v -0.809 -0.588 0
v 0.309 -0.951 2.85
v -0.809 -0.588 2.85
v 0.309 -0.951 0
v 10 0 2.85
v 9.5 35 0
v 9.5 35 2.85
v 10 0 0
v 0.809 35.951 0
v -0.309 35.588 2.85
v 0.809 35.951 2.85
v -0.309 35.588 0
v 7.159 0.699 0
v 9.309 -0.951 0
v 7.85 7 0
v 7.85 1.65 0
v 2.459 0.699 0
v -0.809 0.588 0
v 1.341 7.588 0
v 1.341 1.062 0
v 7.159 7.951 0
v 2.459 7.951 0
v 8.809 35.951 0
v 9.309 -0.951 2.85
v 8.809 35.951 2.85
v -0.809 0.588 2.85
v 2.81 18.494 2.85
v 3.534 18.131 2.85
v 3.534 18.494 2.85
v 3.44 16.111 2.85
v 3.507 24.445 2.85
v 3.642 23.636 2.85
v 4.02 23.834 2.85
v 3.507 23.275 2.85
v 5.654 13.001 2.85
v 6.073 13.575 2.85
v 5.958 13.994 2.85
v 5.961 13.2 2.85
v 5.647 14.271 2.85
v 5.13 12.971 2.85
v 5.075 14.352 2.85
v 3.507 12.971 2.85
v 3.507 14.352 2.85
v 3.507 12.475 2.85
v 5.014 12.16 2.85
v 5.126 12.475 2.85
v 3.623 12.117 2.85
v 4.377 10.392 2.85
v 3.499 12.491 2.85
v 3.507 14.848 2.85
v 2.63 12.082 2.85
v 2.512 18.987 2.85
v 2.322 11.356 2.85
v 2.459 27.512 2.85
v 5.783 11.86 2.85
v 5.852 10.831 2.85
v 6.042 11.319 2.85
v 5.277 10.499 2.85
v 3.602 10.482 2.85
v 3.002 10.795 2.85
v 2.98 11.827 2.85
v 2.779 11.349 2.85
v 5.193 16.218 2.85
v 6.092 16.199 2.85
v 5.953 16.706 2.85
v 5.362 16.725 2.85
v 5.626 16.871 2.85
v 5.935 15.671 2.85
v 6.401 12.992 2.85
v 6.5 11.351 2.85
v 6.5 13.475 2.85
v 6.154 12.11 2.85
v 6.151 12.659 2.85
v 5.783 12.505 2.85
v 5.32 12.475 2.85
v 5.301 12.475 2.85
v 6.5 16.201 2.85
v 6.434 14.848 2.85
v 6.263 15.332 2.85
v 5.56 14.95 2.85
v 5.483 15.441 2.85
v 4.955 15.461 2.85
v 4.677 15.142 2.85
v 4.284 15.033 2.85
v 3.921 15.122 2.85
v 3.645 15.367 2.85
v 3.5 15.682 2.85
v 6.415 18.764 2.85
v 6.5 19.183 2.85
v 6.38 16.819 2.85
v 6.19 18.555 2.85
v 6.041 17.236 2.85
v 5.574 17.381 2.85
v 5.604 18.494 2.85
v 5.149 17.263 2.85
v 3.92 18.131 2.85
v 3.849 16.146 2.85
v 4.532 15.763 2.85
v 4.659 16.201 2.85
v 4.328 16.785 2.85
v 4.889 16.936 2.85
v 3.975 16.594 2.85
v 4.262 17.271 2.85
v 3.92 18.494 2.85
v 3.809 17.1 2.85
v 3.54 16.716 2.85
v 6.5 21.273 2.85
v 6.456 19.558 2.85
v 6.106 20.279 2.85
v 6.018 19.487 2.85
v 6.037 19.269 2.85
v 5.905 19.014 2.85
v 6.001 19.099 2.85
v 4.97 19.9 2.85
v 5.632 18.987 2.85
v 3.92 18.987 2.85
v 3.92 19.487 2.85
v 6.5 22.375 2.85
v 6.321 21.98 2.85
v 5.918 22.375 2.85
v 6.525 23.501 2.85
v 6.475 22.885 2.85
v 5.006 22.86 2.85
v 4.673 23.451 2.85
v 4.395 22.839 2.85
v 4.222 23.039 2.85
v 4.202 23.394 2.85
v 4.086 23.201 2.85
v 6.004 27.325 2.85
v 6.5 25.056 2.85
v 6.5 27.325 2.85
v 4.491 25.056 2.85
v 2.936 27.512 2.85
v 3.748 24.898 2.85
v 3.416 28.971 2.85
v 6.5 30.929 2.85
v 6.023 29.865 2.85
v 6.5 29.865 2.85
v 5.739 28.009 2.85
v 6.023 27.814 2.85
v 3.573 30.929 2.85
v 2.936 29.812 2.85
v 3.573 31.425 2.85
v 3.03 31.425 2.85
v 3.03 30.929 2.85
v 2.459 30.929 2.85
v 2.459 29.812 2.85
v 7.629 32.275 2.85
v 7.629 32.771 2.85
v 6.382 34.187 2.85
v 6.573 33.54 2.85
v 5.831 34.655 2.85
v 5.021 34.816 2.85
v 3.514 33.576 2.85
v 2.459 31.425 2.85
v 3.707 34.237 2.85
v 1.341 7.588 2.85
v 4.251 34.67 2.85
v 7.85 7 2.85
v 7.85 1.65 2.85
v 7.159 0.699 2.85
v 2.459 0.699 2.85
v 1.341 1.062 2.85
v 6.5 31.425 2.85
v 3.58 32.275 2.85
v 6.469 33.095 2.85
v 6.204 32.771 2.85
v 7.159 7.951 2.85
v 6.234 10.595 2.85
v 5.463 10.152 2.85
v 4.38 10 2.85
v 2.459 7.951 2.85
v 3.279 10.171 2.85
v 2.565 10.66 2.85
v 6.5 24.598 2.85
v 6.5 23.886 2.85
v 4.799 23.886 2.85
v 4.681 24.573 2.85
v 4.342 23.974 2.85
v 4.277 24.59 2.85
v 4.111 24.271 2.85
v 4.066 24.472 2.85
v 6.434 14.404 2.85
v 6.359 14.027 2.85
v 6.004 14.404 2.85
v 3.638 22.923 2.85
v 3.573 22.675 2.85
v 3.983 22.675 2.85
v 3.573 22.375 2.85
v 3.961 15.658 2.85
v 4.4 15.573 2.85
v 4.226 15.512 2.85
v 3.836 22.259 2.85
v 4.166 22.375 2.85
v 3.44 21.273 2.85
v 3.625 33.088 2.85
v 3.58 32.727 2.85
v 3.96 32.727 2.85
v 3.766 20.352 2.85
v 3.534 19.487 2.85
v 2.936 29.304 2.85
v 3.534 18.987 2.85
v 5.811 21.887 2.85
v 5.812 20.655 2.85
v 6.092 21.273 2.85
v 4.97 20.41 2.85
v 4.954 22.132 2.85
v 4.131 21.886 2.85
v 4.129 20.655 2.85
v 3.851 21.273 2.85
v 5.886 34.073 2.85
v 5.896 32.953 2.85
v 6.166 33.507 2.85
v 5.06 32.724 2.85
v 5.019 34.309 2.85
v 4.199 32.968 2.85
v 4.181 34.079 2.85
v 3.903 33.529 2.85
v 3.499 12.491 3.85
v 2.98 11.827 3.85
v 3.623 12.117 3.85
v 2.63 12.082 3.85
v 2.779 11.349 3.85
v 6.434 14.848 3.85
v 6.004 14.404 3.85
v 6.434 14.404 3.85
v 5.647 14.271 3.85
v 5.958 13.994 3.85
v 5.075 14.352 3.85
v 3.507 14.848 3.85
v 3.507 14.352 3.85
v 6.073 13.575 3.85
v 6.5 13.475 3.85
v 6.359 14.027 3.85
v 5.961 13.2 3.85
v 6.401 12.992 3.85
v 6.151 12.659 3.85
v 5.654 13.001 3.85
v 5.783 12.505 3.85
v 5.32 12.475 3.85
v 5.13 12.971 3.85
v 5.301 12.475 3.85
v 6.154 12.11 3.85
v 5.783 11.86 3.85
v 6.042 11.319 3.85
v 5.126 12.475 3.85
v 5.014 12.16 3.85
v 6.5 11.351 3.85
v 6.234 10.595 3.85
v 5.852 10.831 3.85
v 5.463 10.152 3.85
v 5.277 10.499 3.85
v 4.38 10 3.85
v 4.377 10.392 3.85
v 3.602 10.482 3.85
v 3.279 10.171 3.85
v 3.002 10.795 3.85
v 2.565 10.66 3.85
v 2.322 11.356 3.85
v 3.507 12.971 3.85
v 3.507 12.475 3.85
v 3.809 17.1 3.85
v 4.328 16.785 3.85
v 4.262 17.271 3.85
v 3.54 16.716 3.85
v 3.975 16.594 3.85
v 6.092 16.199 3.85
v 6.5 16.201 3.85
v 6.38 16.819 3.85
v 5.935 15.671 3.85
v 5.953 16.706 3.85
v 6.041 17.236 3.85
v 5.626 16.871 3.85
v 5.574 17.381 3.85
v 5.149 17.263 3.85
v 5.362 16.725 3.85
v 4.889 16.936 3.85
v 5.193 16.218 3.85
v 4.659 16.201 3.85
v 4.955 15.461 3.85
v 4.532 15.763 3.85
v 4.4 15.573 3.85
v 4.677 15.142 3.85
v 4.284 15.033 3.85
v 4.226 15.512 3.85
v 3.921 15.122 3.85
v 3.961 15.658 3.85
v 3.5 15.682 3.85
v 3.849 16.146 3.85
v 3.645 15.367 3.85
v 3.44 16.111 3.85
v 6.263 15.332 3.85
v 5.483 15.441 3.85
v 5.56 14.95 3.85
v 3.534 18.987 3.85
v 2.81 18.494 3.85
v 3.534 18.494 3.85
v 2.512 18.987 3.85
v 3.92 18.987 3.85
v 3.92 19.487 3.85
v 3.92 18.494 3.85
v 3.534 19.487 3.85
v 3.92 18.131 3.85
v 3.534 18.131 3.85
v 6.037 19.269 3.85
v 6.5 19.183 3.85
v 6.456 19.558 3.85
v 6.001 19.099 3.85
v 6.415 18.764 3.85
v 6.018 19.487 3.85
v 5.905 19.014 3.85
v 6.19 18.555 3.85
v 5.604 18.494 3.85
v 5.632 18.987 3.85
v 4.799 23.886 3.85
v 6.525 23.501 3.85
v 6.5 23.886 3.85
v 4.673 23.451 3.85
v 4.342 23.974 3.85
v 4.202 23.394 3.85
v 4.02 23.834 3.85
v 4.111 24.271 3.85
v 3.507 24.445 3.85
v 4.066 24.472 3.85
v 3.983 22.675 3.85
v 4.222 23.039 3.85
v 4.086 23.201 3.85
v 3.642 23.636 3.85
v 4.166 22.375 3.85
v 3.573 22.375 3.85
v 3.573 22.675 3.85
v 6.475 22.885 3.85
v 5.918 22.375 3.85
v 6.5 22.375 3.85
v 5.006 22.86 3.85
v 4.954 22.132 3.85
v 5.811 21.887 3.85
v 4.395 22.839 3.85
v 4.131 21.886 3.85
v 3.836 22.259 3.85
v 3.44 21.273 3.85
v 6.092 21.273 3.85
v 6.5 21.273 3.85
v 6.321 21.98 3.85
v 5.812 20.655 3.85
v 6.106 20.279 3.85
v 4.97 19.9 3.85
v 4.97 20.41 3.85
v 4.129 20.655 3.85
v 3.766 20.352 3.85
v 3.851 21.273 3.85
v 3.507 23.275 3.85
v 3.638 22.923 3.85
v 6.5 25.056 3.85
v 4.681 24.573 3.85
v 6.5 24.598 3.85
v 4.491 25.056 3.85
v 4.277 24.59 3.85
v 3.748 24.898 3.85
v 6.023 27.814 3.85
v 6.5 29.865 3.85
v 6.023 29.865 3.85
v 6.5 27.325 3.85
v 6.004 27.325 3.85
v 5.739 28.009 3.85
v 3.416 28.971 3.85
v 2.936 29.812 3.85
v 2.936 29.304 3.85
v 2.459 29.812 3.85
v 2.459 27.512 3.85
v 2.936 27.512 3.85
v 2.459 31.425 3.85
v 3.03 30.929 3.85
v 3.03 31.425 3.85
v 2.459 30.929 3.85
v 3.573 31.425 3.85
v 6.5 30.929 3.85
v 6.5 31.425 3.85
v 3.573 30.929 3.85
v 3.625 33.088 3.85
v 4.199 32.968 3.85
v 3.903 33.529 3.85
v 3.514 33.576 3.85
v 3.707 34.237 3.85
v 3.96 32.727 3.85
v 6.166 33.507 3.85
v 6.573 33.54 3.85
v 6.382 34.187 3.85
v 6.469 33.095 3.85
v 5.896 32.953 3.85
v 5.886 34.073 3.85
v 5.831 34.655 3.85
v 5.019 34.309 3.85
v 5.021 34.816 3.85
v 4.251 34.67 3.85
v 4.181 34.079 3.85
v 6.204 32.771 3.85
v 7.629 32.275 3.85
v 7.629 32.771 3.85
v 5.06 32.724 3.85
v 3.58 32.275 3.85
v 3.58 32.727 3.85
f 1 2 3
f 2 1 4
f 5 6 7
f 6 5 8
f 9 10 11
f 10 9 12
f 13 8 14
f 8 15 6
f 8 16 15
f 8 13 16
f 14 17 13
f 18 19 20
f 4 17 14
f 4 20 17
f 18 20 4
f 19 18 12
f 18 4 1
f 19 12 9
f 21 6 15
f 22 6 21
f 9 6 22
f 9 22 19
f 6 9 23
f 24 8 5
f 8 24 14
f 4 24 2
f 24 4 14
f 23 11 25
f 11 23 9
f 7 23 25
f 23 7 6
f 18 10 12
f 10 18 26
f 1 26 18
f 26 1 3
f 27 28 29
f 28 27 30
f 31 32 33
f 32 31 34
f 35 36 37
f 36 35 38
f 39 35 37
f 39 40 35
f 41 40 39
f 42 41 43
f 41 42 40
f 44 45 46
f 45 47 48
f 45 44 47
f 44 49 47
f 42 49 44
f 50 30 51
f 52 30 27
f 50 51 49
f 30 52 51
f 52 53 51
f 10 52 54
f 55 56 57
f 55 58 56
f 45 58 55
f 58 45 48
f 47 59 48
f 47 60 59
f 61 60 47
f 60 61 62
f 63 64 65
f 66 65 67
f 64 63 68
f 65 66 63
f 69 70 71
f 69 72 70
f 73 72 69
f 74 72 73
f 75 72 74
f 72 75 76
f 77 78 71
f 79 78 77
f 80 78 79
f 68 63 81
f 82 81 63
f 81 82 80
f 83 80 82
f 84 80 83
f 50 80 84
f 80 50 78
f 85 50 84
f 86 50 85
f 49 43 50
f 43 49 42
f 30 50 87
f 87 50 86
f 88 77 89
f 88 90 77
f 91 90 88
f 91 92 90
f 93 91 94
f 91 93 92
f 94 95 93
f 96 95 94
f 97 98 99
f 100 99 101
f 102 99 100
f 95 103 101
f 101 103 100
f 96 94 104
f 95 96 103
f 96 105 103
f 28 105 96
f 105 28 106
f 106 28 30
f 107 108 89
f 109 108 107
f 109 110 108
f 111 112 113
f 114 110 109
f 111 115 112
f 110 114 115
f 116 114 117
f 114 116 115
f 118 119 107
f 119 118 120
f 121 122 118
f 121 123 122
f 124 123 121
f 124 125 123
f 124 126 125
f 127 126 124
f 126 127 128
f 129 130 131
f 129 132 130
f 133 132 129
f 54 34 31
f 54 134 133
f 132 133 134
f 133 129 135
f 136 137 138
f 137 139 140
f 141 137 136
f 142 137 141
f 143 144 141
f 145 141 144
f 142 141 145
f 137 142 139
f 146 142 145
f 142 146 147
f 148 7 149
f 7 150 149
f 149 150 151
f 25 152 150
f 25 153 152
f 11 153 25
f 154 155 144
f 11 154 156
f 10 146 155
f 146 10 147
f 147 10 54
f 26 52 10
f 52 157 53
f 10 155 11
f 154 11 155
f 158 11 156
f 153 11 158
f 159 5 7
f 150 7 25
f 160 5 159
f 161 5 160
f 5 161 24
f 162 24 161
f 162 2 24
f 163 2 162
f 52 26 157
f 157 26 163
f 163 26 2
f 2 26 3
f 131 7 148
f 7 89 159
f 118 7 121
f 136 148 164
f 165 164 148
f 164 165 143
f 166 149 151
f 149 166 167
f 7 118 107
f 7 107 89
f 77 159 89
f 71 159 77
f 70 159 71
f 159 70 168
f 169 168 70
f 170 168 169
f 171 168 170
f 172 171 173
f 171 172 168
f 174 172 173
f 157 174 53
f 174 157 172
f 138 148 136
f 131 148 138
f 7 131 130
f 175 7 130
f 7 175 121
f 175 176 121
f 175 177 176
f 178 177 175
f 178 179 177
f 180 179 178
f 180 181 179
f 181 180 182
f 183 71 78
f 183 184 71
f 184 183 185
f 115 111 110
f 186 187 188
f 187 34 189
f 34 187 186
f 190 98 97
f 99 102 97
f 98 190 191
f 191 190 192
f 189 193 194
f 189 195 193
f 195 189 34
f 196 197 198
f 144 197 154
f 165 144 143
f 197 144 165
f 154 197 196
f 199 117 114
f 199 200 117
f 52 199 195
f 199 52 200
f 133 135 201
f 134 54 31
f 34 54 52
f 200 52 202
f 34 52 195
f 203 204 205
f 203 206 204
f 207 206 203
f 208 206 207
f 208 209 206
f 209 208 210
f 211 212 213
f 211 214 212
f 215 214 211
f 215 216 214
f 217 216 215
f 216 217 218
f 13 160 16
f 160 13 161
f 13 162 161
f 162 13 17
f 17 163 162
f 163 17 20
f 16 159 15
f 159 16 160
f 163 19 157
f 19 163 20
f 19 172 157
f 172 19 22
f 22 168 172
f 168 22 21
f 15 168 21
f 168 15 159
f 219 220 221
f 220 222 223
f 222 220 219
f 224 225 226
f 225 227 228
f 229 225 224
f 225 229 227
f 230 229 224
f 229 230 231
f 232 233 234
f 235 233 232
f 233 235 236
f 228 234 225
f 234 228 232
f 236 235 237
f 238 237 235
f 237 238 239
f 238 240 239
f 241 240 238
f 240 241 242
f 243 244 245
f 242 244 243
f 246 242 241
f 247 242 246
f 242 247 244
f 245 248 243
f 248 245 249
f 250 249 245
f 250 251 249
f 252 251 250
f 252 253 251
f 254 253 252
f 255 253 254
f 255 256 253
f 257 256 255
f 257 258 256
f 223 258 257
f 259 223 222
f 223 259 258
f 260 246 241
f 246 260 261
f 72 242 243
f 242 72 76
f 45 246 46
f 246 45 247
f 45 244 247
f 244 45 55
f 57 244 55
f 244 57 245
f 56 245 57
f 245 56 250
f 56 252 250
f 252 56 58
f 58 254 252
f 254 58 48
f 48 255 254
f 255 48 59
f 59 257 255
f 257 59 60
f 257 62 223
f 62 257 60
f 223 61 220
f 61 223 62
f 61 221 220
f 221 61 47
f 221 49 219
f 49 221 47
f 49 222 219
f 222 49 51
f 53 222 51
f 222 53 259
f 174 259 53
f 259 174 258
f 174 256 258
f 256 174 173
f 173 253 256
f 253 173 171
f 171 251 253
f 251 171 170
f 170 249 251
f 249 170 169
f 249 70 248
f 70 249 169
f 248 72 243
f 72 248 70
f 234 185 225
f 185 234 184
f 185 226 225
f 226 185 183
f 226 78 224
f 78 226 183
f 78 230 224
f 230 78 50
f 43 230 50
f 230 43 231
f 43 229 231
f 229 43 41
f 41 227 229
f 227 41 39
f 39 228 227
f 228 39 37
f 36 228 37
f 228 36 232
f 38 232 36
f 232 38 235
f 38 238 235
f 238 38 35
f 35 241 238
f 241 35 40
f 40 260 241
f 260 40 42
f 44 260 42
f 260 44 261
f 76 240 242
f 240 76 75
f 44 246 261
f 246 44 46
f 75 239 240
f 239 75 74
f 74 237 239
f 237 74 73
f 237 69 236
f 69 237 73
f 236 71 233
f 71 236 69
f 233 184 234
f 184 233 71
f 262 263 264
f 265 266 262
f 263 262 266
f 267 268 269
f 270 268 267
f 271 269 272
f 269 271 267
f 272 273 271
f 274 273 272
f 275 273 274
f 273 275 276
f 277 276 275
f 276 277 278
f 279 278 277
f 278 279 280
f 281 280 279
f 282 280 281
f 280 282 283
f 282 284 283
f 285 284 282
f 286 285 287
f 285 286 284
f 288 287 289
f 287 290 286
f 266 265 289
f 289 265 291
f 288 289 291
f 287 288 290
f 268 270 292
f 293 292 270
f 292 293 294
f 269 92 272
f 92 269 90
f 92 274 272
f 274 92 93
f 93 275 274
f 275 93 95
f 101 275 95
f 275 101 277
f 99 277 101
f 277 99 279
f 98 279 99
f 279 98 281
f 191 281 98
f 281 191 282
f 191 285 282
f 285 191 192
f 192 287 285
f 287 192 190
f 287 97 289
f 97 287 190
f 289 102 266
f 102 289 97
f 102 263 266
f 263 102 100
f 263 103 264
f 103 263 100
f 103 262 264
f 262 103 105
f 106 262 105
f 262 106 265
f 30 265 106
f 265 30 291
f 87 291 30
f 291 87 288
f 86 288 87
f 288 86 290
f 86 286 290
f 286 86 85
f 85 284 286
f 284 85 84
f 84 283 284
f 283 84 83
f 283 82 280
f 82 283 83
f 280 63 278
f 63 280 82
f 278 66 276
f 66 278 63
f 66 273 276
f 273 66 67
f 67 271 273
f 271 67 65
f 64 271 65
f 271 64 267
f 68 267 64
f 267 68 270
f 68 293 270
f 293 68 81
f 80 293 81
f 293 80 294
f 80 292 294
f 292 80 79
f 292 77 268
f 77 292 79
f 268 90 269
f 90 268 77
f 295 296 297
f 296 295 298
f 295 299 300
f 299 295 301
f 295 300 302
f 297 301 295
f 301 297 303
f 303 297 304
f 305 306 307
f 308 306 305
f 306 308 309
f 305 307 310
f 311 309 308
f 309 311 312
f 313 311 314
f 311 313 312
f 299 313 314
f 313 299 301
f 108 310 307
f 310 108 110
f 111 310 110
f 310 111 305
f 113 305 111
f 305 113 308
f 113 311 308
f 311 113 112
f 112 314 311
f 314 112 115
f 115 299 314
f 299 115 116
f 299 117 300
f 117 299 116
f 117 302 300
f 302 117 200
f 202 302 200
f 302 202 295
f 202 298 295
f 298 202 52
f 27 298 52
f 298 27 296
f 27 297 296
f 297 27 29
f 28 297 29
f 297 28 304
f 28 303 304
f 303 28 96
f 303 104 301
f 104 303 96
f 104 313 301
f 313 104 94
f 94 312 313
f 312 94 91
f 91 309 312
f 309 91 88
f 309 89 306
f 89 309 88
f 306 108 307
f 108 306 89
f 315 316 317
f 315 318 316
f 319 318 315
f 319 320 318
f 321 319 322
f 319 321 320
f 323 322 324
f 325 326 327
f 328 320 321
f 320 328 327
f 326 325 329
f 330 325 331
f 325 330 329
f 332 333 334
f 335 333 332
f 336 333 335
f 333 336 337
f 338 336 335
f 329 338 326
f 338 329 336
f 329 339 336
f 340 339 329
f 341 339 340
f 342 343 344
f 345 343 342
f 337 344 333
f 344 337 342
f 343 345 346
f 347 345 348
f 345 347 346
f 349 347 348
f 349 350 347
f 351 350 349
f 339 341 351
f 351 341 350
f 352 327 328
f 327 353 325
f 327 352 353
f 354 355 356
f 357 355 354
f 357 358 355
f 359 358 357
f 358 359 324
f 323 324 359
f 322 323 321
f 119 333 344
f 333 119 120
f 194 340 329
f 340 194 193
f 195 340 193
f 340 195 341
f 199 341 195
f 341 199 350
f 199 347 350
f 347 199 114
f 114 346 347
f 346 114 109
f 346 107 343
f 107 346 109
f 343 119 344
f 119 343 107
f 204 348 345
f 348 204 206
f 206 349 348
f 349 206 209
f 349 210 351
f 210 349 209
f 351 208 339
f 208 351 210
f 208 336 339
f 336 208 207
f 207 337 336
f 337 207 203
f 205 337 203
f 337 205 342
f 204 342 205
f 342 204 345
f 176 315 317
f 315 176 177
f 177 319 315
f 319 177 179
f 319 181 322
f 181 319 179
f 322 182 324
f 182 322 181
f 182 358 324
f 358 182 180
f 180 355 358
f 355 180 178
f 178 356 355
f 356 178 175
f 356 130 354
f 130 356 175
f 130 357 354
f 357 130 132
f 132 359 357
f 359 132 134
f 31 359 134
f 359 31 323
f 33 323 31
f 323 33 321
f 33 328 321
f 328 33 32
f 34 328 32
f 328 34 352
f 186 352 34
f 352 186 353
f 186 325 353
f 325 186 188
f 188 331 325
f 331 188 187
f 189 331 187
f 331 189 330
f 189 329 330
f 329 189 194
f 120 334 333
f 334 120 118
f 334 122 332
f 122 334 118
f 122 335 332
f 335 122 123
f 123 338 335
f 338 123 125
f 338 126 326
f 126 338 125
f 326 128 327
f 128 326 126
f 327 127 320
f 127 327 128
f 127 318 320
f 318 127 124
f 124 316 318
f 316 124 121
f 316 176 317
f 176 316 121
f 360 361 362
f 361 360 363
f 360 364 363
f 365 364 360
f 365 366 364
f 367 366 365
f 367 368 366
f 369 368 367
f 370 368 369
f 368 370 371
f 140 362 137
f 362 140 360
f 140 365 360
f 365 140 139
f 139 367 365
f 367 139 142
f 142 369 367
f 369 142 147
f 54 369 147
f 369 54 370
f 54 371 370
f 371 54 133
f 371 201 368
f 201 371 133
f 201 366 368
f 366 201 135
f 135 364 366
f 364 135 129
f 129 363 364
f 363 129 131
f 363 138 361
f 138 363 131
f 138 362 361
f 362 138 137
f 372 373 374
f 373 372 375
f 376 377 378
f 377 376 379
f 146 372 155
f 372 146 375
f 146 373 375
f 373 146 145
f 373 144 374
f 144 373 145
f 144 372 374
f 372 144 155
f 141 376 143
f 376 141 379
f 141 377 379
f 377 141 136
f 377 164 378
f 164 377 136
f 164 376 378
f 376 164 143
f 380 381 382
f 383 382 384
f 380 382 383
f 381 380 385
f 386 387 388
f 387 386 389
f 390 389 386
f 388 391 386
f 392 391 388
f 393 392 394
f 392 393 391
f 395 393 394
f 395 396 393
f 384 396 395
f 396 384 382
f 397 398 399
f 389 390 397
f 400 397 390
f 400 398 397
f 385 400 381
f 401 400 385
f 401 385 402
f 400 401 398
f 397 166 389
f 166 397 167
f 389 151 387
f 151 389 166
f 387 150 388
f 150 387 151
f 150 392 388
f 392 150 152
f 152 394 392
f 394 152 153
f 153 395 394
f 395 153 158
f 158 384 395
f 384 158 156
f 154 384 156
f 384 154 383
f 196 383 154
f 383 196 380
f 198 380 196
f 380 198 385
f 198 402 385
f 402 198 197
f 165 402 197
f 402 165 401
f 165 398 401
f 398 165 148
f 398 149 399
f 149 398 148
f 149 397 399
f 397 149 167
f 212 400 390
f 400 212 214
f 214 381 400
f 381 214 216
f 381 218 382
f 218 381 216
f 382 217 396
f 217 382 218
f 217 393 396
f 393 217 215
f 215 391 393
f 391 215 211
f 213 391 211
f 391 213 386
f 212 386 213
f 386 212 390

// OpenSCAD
/**
 * Pieza para cremallera
 * Diego Viejo
 * 16 Marzo 2013
 * 
 * Uses Write.scad from Harlan Martin - harlan@sutlog.com
 * You'll need to download it and locate it in the same folder or change the next use-sentence to link it correctly
 */
use<Write.scad>


//parameters
Text = "Custom Zip";
textHeight = 4;
height = 2.85;
ancho1 = 9;
ancho2 = 8;
pared = 1.65;
hueco = 7;
largo = 35;


rad = 1;

module cremalleraBlock()
{
  hull()
  {
    cylinder(r=rad, h=height);
    translate([ancho1, 0, 0]) cylinder(r=rad, h=height);
    translate([(ancho1-ancho2)/2, largo, 0]) cylinder(r=rad, h=height);
    translate([(ancho1-ancho2)/2+ancho2, largo, 0]) cylinder(r=rad, h=height);
  }
}

module cremalleraHoles()
{
  hull()
  {
    translate([(ancho1-ancho2)/2+pared, pared, -1]) cylinder(r=rad, h=height+2);
    translate([(ancho1-ancho2)/2+ancho2-pared, pared, -1]) cylinder(r=rad, h=height+2);
    translate([(ancho1-ancho2)/2+pared, hueco, -1]) cylinder(r=rad, h=height+2);
    translate([(ancho1-ancho2)/2+ancho2-pared, hueco, -1]) cylinder(r=rad, h=height+2);
  }
}

module cremallera()
{
  difference()
  {
    cremalleraBlock();
    cremalleraHoles();
  }
  translate([ancho1-0.5-(ancho2-textHeight)/2,10,height-1]) rotate([0, 0, 90])
    write(Text, h=textHeight, t=2,space=0.9);
}

cremallera();
